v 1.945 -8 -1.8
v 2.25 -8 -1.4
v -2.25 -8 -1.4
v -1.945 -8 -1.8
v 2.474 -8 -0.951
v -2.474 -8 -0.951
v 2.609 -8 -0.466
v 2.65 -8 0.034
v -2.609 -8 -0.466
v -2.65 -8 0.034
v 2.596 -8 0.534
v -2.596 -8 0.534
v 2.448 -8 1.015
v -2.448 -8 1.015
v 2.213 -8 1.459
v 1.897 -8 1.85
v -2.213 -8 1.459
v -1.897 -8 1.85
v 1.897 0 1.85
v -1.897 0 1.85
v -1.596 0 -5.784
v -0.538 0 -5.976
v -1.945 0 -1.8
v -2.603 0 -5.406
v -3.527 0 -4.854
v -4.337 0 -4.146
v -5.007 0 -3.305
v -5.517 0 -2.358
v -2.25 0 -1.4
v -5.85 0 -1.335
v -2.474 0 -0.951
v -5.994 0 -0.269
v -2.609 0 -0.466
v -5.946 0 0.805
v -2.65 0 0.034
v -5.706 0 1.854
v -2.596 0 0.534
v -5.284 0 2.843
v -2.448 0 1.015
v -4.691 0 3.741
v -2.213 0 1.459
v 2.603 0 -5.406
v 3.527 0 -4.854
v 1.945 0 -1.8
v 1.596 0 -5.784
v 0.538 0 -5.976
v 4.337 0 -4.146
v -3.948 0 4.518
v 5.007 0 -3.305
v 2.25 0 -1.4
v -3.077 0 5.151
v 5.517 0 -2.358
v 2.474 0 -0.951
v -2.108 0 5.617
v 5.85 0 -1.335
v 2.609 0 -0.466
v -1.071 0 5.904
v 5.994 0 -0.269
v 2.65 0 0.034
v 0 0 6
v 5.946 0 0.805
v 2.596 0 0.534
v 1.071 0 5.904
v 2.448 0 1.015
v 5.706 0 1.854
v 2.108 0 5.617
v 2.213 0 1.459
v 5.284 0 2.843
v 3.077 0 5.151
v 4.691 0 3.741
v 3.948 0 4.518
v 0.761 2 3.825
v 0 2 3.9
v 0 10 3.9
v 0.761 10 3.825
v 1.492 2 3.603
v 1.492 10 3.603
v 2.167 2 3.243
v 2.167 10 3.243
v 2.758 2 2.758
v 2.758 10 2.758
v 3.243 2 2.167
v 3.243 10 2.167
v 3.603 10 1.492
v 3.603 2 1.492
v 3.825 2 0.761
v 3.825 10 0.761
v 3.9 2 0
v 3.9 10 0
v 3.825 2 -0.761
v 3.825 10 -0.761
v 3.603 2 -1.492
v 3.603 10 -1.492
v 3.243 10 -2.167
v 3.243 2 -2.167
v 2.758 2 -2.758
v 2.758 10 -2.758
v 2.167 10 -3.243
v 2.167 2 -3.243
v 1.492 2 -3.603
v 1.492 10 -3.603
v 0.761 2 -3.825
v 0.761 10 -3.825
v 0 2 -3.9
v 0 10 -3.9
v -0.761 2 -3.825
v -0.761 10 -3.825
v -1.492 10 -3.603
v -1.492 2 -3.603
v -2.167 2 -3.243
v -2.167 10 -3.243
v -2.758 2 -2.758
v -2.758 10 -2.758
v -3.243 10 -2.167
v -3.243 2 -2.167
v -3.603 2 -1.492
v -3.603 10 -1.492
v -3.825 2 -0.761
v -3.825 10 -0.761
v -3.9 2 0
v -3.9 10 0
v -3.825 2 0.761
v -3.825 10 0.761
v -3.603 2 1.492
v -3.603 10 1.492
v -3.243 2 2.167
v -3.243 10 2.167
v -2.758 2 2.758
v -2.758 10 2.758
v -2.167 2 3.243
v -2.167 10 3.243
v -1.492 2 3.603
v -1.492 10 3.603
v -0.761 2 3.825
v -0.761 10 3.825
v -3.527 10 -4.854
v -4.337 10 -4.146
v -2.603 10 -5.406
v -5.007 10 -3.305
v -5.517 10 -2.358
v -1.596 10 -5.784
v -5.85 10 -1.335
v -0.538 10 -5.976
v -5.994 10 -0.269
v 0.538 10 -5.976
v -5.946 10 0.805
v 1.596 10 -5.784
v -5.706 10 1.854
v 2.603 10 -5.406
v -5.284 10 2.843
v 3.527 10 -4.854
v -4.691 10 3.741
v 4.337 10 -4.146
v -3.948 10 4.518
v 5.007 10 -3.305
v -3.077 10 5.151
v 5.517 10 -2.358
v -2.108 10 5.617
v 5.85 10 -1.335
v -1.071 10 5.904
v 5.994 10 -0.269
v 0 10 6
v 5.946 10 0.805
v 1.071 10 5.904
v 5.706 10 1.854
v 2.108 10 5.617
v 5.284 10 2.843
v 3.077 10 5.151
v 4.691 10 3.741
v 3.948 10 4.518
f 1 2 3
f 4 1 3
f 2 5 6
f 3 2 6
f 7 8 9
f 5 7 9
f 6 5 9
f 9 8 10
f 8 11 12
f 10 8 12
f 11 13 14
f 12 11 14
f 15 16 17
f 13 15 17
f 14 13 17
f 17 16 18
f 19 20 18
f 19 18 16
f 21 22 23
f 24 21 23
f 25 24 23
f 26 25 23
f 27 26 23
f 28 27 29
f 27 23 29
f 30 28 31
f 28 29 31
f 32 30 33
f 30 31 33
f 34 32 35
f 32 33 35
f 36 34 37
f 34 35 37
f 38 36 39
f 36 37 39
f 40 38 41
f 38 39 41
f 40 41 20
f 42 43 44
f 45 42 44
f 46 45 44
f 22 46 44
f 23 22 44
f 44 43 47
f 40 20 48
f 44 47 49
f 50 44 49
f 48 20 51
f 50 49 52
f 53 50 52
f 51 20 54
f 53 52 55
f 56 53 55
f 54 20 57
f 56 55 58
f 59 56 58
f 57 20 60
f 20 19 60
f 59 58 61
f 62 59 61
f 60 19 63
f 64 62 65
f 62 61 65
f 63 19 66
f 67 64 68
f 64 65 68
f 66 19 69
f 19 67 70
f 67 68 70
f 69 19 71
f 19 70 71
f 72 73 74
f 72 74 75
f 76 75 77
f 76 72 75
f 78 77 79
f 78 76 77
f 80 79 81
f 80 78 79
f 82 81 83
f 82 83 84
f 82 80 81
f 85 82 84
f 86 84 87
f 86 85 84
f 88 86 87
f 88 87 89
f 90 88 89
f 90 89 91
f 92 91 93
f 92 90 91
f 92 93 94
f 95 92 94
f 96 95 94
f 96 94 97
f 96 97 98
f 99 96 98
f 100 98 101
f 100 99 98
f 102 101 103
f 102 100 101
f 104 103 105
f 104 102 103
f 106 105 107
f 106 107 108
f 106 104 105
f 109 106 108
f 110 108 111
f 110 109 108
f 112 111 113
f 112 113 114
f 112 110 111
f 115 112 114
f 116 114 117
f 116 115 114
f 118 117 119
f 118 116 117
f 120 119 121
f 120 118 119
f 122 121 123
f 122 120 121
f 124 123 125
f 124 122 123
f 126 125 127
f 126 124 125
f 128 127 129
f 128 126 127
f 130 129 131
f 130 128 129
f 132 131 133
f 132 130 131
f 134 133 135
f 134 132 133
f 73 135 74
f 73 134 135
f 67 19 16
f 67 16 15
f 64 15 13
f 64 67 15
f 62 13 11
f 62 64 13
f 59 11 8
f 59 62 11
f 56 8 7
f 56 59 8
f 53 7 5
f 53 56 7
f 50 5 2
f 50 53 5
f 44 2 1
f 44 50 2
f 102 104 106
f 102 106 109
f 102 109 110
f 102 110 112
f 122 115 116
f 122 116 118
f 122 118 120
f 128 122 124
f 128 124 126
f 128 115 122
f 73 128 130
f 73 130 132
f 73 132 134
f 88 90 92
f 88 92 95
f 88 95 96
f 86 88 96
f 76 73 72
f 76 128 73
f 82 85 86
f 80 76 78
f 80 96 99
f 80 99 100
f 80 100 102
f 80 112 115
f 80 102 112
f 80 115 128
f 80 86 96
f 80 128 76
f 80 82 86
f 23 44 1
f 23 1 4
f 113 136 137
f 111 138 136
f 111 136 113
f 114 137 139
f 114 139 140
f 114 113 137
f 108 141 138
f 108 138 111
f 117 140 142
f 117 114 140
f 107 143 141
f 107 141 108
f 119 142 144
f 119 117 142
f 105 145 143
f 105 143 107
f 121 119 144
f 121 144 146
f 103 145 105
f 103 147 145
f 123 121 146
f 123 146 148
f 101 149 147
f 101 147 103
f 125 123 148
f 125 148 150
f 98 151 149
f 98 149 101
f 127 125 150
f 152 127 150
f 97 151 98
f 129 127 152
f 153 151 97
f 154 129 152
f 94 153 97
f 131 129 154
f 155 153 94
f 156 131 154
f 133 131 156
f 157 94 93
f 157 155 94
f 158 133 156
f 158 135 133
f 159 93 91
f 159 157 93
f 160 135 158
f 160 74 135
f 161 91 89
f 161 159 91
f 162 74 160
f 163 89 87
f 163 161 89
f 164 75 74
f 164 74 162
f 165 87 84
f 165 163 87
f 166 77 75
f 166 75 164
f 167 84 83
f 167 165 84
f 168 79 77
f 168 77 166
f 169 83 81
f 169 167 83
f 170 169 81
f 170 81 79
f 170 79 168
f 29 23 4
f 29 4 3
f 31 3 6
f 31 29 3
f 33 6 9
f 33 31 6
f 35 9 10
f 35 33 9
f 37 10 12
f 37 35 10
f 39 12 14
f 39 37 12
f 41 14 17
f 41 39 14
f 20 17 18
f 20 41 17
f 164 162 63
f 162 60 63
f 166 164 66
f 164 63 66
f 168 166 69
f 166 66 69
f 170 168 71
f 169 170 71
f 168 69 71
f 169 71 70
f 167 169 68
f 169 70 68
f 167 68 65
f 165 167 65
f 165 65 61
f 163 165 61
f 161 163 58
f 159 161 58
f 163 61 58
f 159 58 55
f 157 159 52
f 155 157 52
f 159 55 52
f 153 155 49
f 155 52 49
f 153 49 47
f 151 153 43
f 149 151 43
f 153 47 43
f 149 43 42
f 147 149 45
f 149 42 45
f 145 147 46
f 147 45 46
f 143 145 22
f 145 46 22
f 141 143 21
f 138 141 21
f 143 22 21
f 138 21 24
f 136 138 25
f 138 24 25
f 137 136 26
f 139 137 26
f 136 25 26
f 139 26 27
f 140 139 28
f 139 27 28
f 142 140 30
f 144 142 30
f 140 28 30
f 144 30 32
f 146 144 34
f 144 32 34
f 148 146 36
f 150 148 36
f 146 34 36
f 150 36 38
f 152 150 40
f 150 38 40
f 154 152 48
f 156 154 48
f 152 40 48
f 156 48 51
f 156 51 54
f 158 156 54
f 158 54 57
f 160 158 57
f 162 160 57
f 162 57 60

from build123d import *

# Parameters (mm, degrees)
SKETCH1_R           = 6
BOSS_EXTRUDE1_DEPTH = 2
SKETCH2_R           = 6
SKETCH2_R_2         = 3.9
BOSS_EXTRUDE2_DEPTH = 8
BOSS_EXTRUDE3_DEPTH = 8


with BuildPart() as part:
    # Sketch1 → Boss-Extrude1 (new body)
    with BuildSketch(Plane(origin=(0, 0, 0), x_dir=(1, 0, 0), z_dir=(0, 1, 0))):
        with Locations(Location((0, 0, 0), (0, 0, 270))):
            Circle(SKETCH1_R)
    extrude(amount=BOSS_EXTRUDE1_DEPTH)

    # Sketch2 → Boss-Extrude2 (add)
    with BuildSketch(Plane(origin=(0, 2, 0), x_dir=(1, 0, 0), z_dir=(0, 1, 0))):
        with Locations(Location((0, 0, 0), (0, 0, 270))):
            Circle(SKETCH2_R)
        with Locations(Location((0, 0, 0), (0, 0, 270))):
            Circle(SKETCH2_R_2, mode=Mode.SUBTRACT)
    extrude(amount=BOSS_EXTRUDE2_DEPTH)

    # Sketch3 → Boss-Extrude3 (add)
    with BuildSketch(Plane.XZ):
        with BuildLine():
            Line((-1.897366596, 1.85), (1.897366596, 1.85))
            ThreePointArc((1.897366596, 1.85), (2.649775646, 0.034482248), (1.944865034, -1.8))
            Line((1.944865034, -1.8), (-1.944865034, -1.8))
            ThreePointArc((-1.944865034, -1.8), (-2.649775646, 0.034482248), (-1.897366596, 1.85))
        make_face()
    extrude(amount=BOSS_EXTRUDE3_DEPTH)


solid = part.part
